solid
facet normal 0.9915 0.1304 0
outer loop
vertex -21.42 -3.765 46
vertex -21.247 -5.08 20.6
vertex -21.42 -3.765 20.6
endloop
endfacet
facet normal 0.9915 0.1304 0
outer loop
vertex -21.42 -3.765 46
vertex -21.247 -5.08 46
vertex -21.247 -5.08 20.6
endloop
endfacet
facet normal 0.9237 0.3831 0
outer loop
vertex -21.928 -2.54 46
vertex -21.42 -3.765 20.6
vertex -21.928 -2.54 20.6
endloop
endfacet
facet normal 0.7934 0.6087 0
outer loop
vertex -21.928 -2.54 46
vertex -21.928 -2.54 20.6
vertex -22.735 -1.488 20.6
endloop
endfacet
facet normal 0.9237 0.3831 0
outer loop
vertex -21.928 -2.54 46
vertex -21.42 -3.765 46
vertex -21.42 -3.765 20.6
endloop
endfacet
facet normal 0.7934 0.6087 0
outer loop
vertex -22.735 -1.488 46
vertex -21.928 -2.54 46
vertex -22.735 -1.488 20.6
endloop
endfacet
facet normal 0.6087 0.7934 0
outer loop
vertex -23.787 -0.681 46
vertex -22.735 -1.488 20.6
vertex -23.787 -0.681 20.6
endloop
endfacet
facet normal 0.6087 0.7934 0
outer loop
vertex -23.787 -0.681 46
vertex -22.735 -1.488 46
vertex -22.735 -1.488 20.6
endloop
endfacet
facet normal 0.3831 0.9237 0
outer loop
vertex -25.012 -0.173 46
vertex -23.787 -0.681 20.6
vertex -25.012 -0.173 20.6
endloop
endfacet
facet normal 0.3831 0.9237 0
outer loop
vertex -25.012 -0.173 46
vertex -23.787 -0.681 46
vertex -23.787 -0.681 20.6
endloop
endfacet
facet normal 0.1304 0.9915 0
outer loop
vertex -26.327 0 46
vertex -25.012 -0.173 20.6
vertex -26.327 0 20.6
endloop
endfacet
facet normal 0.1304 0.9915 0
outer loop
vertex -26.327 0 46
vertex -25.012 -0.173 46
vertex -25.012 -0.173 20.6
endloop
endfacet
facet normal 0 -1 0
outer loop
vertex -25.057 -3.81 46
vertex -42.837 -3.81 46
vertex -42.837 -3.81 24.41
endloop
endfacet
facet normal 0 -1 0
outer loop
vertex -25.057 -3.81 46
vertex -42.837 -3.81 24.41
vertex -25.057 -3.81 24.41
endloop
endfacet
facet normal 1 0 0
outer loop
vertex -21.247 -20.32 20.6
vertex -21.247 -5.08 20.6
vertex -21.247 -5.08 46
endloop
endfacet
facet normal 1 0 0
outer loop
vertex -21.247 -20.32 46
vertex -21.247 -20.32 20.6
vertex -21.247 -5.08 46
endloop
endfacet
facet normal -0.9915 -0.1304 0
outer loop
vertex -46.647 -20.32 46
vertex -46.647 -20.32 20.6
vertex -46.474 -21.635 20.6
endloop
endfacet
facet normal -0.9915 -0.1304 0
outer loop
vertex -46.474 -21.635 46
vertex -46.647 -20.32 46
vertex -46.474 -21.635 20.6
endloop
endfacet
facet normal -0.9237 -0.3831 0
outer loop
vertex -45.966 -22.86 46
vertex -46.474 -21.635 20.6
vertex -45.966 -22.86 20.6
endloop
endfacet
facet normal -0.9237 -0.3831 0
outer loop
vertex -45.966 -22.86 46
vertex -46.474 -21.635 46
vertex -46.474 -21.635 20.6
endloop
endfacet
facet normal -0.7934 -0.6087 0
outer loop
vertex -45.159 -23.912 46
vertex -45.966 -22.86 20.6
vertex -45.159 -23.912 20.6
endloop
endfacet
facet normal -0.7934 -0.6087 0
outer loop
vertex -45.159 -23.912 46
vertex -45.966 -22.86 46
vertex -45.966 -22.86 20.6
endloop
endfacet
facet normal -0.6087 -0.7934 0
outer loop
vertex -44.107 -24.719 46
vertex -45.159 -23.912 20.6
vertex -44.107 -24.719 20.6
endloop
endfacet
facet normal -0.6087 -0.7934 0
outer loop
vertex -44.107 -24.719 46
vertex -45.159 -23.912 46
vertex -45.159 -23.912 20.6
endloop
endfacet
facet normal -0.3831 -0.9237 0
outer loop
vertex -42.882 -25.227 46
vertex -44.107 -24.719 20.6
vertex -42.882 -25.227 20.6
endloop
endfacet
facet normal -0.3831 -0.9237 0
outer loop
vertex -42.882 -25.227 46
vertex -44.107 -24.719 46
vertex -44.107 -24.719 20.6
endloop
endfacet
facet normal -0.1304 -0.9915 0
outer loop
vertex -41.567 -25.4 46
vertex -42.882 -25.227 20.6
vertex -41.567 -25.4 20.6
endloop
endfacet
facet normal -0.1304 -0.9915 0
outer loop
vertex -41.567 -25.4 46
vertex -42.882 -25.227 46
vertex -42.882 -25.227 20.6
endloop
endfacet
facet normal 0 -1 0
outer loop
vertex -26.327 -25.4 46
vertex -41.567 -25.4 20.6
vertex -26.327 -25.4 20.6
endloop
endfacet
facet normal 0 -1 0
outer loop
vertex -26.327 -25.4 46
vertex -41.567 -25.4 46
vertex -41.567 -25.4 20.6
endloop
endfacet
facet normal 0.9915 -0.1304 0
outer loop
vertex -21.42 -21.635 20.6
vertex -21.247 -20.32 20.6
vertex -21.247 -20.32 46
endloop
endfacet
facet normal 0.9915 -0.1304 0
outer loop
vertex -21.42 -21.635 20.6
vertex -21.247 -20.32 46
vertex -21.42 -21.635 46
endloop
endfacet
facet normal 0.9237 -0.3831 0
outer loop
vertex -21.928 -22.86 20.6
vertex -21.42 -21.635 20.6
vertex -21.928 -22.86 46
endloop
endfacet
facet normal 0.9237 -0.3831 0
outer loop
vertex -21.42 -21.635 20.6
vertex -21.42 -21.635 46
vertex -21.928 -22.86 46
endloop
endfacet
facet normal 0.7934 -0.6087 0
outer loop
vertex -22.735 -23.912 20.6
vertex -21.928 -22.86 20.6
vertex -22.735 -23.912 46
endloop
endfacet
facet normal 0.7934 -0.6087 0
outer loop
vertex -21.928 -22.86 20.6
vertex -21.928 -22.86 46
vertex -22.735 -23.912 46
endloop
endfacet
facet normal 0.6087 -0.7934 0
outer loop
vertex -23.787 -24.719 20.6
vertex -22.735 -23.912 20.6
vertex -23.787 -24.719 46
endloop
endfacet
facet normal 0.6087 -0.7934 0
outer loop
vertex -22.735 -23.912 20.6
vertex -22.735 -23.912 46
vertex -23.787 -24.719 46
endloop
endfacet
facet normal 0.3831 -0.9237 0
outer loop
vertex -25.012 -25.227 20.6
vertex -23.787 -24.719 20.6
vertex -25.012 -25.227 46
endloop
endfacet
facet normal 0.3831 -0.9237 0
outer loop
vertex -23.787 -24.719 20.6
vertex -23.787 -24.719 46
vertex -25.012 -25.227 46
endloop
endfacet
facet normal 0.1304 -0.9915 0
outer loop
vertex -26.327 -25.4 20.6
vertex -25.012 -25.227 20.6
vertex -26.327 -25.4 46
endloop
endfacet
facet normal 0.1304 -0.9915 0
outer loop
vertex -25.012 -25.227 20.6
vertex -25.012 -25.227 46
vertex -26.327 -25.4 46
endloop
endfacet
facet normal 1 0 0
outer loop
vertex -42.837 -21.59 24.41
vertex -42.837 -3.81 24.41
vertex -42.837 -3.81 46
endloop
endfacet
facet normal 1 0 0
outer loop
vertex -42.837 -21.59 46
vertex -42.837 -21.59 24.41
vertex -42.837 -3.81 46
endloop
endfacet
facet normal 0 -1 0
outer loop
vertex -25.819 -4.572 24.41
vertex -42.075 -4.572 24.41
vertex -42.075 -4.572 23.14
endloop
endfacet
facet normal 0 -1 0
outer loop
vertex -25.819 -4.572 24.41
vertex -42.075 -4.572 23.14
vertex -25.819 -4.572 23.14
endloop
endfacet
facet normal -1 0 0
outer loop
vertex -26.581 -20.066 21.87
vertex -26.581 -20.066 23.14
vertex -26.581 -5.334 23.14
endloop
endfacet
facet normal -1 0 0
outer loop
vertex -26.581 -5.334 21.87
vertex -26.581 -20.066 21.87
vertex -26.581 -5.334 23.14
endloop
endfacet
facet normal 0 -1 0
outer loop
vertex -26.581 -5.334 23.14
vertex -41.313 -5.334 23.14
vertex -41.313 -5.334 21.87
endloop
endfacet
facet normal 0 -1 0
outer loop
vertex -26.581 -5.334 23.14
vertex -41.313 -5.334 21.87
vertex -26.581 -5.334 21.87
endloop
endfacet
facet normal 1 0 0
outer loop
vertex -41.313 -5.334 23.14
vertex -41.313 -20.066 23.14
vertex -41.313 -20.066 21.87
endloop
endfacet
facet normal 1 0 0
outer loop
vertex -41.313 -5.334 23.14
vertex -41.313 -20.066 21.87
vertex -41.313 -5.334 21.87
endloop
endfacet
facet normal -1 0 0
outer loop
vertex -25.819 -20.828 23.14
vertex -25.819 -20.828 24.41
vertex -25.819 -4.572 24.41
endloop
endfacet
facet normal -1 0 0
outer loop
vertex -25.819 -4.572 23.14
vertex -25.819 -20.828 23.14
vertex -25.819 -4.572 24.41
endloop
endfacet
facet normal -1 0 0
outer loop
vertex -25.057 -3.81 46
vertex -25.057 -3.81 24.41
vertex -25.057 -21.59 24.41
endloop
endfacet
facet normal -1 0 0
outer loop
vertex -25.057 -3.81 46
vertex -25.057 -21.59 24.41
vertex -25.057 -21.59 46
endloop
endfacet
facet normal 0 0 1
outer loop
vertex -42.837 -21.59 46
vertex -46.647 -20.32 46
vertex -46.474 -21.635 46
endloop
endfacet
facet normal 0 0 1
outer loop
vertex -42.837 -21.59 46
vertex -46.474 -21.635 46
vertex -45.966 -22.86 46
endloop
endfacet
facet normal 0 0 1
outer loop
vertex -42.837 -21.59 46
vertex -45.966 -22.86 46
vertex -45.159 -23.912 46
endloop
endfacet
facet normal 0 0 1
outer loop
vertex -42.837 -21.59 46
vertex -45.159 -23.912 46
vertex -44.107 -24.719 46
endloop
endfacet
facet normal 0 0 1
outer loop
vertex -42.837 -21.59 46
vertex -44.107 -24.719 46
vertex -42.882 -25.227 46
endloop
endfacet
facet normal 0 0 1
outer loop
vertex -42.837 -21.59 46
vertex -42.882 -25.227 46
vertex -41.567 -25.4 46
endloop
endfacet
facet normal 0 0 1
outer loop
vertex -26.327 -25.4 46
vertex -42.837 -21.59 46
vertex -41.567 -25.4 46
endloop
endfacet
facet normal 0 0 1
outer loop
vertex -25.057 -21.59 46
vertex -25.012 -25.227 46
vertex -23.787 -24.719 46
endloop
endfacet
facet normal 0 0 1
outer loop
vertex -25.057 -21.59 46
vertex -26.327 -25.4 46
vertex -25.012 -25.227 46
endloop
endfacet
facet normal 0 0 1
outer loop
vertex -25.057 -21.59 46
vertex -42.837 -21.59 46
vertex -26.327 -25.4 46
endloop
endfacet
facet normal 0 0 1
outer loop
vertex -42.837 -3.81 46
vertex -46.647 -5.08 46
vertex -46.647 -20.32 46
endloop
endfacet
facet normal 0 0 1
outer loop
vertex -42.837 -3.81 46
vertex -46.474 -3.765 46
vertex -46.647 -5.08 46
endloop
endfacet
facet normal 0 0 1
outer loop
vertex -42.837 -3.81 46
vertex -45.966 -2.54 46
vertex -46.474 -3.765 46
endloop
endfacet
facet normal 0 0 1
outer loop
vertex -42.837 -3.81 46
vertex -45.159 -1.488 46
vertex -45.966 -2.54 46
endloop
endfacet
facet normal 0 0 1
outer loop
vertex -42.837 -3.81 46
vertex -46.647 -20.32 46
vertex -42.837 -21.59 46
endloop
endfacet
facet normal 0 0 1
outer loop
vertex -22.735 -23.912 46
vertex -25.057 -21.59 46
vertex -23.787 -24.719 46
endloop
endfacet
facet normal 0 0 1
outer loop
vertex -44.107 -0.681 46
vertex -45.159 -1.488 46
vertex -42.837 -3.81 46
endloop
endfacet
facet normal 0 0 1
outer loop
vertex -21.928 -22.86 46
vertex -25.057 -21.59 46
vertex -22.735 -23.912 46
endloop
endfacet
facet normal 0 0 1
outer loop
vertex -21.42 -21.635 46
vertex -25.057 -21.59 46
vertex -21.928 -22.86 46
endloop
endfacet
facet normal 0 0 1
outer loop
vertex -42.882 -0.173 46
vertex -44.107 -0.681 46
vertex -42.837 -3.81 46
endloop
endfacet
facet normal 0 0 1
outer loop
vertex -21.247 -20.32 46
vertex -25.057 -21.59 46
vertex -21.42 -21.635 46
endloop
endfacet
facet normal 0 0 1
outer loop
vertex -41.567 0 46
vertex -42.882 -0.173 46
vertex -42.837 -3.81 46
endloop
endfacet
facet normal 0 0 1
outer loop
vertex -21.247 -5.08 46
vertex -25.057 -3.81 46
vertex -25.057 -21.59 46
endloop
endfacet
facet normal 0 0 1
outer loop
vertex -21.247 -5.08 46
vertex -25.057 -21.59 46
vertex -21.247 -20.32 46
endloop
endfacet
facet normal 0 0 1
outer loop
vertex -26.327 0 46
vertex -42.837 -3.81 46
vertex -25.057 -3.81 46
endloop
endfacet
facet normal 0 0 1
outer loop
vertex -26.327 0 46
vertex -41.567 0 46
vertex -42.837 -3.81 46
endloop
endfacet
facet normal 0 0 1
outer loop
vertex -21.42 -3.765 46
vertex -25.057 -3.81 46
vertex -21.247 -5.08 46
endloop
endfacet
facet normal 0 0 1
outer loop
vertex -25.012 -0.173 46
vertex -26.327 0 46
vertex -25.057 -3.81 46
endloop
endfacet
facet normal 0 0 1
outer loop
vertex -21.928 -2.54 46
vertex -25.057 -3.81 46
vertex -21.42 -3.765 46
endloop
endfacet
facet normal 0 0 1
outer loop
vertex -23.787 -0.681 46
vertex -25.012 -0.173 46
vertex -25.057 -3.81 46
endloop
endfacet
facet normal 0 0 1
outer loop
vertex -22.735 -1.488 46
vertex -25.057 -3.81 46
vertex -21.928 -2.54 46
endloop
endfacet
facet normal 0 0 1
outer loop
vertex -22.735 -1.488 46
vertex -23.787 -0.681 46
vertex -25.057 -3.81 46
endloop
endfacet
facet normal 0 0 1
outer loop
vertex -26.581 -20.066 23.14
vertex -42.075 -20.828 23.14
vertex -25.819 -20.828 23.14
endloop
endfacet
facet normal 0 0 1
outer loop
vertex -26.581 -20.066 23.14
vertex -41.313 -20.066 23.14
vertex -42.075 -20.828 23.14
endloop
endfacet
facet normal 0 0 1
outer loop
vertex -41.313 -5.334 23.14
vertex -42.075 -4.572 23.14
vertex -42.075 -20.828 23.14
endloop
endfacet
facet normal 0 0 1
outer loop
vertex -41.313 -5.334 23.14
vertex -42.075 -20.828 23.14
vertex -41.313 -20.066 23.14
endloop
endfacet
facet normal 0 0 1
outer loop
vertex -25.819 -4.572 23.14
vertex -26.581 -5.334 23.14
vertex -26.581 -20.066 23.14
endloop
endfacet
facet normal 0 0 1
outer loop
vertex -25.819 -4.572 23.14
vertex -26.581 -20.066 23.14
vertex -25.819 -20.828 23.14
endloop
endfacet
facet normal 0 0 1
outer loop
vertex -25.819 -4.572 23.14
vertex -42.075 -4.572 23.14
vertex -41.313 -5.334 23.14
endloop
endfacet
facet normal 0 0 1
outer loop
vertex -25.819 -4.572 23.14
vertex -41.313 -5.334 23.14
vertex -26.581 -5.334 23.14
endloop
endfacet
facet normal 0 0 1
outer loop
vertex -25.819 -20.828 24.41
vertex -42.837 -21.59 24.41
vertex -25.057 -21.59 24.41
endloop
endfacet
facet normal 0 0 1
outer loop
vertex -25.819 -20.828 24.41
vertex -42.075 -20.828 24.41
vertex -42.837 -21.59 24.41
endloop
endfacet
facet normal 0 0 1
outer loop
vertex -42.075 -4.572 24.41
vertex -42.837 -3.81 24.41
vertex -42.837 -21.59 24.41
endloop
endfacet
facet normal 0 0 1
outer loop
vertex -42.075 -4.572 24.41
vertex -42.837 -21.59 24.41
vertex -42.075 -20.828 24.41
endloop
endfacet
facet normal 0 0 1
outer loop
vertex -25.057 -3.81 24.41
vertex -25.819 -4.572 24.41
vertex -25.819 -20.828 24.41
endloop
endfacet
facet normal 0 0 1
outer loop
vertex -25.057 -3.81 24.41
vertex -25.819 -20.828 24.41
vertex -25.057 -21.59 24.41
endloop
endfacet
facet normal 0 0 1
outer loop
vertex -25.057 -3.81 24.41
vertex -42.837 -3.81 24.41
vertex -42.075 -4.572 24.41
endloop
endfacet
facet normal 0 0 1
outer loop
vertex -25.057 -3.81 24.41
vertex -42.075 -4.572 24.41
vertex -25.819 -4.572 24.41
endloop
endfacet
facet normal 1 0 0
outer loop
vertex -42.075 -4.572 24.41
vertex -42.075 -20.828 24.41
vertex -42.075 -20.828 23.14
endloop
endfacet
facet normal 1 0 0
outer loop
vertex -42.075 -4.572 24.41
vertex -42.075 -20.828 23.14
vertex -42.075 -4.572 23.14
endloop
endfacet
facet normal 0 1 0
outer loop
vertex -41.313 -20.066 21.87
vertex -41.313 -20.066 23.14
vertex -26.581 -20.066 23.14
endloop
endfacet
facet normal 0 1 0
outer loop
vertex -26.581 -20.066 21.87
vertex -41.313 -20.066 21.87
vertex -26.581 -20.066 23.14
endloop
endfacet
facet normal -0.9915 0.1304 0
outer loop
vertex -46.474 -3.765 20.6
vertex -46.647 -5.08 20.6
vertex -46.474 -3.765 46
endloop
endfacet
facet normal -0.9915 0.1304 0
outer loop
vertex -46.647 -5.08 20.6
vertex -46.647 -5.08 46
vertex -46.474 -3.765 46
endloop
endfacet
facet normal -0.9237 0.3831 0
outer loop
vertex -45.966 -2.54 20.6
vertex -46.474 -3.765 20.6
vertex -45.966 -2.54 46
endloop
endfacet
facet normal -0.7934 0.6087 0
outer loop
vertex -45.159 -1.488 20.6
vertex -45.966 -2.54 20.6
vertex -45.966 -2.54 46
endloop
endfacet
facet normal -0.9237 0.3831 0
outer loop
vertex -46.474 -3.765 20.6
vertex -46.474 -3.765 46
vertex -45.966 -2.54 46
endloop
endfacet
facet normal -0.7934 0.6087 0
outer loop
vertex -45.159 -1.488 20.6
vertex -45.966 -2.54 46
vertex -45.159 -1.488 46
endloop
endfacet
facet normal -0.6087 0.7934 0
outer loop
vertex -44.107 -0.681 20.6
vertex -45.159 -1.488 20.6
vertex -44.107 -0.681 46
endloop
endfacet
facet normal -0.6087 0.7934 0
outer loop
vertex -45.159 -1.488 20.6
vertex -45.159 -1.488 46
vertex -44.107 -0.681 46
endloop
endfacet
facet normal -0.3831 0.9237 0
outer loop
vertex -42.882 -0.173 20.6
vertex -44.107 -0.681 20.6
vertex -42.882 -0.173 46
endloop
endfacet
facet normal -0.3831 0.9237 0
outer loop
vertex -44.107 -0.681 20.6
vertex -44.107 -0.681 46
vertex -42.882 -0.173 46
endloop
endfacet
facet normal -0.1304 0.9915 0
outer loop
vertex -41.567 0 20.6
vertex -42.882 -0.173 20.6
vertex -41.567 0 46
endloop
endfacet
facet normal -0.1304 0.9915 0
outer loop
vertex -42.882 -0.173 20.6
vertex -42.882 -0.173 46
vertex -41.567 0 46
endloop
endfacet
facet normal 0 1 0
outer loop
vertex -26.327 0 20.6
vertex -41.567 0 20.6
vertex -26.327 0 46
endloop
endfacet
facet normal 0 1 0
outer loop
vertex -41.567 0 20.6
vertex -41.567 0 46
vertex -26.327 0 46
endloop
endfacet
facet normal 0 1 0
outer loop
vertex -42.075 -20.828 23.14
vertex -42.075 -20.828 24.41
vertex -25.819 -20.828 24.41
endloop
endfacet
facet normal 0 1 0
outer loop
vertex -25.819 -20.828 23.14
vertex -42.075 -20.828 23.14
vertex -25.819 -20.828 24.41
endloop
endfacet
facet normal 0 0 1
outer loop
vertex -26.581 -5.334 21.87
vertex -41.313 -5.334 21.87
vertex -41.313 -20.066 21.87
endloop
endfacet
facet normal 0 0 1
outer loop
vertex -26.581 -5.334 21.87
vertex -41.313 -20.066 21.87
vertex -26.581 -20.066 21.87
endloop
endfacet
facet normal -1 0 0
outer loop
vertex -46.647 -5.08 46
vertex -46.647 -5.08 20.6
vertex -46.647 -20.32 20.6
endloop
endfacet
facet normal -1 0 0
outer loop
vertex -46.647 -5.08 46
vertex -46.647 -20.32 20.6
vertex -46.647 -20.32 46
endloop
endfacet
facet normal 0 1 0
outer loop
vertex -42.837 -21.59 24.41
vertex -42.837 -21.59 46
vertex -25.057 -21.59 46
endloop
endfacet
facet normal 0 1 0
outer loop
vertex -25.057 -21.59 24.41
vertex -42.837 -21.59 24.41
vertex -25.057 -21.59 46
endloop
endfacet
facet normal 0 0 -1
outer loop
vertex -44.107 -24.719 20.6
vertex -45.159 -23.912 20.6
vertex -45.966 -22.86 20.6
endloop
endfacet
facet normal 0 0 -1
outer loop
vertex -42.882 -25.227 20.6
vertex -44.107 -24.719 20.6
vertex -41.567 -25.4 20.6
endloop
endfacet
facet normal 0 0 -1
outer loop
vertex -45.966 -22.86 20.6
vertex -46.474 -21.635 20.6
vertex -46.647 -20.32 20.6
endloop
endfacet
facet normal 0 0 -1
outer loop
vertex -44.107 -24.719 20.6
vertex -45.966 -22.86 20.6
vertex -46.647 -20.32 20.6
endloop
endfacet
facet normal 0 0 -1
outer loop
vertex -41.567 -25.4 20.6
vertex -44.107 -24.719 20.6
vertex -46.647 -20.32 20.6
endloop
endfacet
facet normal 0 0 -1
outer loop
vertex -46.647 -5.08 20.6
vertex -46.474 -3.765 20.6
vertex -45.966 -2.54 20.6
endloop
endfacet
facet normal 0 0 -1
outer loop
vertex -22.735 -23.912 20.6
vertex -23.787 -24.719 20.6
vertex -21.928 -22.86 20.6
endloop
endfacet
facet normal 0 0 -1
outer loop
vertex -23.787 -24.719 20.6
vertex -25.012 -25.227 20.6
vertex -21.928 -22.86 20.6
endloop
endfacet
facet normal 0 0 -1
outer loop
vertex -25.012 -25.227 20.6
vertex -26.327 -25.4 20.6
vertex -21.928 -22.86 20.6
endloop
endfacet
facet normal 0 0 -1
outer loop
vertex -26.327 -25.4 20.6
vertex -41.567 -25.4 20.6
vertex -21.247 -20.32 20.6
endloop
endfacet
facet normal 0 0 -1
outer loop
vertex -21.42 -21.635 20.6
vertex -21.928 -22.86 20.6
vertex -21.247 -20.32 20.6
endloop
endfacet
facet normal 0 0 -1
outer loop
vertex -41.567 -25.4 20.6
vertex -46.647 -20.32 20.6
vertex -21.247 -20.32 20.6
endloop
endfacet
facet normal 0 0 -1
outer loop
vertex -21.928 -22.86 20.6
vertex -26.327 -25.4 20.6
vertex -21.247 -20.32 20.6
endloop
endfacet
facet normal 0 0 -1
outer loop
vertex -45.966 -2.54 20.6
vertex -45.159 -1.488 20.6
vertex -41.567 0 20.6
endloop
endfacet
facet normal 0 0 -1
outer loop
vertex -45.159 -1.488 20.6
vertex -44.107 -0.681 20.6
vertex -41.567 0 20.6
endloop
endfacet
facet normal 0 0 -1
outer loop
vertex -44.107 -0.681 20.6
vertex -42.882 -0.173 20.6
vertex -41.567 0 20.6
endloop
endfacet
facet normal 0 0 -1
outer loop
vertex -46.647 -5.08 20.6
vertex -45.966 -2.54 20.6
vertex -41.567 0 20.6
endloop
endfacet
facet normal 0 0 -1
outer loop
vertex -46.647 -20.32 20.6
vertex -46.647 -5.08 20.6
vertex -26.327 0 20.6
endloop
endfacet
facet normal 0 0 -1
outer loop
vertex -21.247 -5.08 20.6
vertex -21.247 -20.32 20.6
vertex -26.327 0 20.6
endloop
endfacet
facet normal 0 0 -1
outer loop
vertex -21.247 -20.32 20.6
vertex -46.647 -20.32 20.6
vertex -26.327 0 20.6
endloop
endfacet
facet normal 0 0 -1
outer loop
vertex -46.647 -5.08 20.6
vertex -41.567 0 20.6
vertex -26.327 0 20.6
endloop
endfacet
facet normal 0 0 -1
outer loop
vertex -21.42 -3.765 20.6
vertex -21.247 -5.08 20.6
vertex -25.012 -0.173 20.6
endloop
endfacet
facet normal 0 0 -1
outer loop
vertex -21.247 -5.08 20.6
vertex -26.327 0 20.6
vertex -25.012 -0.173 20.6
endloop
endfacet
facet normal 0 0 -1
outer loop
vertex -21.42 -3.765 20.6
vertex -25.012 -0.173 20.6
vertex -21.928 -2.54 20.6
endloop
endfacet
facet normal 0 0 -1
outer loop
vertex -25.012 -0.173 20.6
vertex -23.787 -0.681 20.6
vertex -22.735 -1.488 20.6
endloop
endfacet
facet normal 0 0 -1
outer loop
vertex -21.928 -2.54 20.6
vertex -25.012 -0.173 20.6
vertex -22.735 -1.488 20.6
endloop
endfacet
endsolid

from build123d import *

# Parameters (mm, degrees)
F0_W     = 25.4
F0_H     = 25.4
F1_DEPTH = 25.4
F2_T     = -3.81
F3_R     = 5.08
F5_W     = 16.256
F5_H     = 16.256
F6_DEPTH = 1.27
F7_W     = 14.732
F7_H     = 14.732
F8_DEPTH = 2.54


with BuildPart() as f1:
    # F0 (on Front) → F1 (new body)
    with BuildSketch(Plane.XZ):
        with Locations((-33.946944, 33.299525)):
            Rectangle(F0_W, F0_H)
    extrude(amount=F1_DEPTH)

    # F2
    f2_openings = [f1.faces().sort_by_distance(p)[0] for p in [
        (-33.946944, -12.7, 45.999525),
    ]]
    offset(amount=F2_T, openings=f2_openings)

    # F3
    f3_edges = [f1.edges().sort_by_distance(p)[0] for p in [
        (-46.646944, 0, 33.299525),
        (-46.646944, -25.4, 33.299525),
        (-21.246944, -25.4, 33.299525),
        (-21.246944, 0, 33.299525),
    ]]
    fillet(f3_edges, radius=F3_R)

    # F5 (on face) → F6 (cut)
    with BuildSketch(Plane.XY.offset(24.409525)):
        with Locations((-33.946944, -12.7)):
            Rectangle(F5_W, F5_H)
    extrude(amount=-F6_DEPTH, mode=Mode.SUBTRACT)

    # F7 (on face) → F8 (cut)
    with BuildSketch(Plane.XY.offset(24.409525)):
        with Locations((-33.946944, -12.7)):
            Rectangle(F7_W, F7_H)
    extrude(amount=-F8_DEPTH, mode=Mode.SUBTRACT)


solid = f1.part
